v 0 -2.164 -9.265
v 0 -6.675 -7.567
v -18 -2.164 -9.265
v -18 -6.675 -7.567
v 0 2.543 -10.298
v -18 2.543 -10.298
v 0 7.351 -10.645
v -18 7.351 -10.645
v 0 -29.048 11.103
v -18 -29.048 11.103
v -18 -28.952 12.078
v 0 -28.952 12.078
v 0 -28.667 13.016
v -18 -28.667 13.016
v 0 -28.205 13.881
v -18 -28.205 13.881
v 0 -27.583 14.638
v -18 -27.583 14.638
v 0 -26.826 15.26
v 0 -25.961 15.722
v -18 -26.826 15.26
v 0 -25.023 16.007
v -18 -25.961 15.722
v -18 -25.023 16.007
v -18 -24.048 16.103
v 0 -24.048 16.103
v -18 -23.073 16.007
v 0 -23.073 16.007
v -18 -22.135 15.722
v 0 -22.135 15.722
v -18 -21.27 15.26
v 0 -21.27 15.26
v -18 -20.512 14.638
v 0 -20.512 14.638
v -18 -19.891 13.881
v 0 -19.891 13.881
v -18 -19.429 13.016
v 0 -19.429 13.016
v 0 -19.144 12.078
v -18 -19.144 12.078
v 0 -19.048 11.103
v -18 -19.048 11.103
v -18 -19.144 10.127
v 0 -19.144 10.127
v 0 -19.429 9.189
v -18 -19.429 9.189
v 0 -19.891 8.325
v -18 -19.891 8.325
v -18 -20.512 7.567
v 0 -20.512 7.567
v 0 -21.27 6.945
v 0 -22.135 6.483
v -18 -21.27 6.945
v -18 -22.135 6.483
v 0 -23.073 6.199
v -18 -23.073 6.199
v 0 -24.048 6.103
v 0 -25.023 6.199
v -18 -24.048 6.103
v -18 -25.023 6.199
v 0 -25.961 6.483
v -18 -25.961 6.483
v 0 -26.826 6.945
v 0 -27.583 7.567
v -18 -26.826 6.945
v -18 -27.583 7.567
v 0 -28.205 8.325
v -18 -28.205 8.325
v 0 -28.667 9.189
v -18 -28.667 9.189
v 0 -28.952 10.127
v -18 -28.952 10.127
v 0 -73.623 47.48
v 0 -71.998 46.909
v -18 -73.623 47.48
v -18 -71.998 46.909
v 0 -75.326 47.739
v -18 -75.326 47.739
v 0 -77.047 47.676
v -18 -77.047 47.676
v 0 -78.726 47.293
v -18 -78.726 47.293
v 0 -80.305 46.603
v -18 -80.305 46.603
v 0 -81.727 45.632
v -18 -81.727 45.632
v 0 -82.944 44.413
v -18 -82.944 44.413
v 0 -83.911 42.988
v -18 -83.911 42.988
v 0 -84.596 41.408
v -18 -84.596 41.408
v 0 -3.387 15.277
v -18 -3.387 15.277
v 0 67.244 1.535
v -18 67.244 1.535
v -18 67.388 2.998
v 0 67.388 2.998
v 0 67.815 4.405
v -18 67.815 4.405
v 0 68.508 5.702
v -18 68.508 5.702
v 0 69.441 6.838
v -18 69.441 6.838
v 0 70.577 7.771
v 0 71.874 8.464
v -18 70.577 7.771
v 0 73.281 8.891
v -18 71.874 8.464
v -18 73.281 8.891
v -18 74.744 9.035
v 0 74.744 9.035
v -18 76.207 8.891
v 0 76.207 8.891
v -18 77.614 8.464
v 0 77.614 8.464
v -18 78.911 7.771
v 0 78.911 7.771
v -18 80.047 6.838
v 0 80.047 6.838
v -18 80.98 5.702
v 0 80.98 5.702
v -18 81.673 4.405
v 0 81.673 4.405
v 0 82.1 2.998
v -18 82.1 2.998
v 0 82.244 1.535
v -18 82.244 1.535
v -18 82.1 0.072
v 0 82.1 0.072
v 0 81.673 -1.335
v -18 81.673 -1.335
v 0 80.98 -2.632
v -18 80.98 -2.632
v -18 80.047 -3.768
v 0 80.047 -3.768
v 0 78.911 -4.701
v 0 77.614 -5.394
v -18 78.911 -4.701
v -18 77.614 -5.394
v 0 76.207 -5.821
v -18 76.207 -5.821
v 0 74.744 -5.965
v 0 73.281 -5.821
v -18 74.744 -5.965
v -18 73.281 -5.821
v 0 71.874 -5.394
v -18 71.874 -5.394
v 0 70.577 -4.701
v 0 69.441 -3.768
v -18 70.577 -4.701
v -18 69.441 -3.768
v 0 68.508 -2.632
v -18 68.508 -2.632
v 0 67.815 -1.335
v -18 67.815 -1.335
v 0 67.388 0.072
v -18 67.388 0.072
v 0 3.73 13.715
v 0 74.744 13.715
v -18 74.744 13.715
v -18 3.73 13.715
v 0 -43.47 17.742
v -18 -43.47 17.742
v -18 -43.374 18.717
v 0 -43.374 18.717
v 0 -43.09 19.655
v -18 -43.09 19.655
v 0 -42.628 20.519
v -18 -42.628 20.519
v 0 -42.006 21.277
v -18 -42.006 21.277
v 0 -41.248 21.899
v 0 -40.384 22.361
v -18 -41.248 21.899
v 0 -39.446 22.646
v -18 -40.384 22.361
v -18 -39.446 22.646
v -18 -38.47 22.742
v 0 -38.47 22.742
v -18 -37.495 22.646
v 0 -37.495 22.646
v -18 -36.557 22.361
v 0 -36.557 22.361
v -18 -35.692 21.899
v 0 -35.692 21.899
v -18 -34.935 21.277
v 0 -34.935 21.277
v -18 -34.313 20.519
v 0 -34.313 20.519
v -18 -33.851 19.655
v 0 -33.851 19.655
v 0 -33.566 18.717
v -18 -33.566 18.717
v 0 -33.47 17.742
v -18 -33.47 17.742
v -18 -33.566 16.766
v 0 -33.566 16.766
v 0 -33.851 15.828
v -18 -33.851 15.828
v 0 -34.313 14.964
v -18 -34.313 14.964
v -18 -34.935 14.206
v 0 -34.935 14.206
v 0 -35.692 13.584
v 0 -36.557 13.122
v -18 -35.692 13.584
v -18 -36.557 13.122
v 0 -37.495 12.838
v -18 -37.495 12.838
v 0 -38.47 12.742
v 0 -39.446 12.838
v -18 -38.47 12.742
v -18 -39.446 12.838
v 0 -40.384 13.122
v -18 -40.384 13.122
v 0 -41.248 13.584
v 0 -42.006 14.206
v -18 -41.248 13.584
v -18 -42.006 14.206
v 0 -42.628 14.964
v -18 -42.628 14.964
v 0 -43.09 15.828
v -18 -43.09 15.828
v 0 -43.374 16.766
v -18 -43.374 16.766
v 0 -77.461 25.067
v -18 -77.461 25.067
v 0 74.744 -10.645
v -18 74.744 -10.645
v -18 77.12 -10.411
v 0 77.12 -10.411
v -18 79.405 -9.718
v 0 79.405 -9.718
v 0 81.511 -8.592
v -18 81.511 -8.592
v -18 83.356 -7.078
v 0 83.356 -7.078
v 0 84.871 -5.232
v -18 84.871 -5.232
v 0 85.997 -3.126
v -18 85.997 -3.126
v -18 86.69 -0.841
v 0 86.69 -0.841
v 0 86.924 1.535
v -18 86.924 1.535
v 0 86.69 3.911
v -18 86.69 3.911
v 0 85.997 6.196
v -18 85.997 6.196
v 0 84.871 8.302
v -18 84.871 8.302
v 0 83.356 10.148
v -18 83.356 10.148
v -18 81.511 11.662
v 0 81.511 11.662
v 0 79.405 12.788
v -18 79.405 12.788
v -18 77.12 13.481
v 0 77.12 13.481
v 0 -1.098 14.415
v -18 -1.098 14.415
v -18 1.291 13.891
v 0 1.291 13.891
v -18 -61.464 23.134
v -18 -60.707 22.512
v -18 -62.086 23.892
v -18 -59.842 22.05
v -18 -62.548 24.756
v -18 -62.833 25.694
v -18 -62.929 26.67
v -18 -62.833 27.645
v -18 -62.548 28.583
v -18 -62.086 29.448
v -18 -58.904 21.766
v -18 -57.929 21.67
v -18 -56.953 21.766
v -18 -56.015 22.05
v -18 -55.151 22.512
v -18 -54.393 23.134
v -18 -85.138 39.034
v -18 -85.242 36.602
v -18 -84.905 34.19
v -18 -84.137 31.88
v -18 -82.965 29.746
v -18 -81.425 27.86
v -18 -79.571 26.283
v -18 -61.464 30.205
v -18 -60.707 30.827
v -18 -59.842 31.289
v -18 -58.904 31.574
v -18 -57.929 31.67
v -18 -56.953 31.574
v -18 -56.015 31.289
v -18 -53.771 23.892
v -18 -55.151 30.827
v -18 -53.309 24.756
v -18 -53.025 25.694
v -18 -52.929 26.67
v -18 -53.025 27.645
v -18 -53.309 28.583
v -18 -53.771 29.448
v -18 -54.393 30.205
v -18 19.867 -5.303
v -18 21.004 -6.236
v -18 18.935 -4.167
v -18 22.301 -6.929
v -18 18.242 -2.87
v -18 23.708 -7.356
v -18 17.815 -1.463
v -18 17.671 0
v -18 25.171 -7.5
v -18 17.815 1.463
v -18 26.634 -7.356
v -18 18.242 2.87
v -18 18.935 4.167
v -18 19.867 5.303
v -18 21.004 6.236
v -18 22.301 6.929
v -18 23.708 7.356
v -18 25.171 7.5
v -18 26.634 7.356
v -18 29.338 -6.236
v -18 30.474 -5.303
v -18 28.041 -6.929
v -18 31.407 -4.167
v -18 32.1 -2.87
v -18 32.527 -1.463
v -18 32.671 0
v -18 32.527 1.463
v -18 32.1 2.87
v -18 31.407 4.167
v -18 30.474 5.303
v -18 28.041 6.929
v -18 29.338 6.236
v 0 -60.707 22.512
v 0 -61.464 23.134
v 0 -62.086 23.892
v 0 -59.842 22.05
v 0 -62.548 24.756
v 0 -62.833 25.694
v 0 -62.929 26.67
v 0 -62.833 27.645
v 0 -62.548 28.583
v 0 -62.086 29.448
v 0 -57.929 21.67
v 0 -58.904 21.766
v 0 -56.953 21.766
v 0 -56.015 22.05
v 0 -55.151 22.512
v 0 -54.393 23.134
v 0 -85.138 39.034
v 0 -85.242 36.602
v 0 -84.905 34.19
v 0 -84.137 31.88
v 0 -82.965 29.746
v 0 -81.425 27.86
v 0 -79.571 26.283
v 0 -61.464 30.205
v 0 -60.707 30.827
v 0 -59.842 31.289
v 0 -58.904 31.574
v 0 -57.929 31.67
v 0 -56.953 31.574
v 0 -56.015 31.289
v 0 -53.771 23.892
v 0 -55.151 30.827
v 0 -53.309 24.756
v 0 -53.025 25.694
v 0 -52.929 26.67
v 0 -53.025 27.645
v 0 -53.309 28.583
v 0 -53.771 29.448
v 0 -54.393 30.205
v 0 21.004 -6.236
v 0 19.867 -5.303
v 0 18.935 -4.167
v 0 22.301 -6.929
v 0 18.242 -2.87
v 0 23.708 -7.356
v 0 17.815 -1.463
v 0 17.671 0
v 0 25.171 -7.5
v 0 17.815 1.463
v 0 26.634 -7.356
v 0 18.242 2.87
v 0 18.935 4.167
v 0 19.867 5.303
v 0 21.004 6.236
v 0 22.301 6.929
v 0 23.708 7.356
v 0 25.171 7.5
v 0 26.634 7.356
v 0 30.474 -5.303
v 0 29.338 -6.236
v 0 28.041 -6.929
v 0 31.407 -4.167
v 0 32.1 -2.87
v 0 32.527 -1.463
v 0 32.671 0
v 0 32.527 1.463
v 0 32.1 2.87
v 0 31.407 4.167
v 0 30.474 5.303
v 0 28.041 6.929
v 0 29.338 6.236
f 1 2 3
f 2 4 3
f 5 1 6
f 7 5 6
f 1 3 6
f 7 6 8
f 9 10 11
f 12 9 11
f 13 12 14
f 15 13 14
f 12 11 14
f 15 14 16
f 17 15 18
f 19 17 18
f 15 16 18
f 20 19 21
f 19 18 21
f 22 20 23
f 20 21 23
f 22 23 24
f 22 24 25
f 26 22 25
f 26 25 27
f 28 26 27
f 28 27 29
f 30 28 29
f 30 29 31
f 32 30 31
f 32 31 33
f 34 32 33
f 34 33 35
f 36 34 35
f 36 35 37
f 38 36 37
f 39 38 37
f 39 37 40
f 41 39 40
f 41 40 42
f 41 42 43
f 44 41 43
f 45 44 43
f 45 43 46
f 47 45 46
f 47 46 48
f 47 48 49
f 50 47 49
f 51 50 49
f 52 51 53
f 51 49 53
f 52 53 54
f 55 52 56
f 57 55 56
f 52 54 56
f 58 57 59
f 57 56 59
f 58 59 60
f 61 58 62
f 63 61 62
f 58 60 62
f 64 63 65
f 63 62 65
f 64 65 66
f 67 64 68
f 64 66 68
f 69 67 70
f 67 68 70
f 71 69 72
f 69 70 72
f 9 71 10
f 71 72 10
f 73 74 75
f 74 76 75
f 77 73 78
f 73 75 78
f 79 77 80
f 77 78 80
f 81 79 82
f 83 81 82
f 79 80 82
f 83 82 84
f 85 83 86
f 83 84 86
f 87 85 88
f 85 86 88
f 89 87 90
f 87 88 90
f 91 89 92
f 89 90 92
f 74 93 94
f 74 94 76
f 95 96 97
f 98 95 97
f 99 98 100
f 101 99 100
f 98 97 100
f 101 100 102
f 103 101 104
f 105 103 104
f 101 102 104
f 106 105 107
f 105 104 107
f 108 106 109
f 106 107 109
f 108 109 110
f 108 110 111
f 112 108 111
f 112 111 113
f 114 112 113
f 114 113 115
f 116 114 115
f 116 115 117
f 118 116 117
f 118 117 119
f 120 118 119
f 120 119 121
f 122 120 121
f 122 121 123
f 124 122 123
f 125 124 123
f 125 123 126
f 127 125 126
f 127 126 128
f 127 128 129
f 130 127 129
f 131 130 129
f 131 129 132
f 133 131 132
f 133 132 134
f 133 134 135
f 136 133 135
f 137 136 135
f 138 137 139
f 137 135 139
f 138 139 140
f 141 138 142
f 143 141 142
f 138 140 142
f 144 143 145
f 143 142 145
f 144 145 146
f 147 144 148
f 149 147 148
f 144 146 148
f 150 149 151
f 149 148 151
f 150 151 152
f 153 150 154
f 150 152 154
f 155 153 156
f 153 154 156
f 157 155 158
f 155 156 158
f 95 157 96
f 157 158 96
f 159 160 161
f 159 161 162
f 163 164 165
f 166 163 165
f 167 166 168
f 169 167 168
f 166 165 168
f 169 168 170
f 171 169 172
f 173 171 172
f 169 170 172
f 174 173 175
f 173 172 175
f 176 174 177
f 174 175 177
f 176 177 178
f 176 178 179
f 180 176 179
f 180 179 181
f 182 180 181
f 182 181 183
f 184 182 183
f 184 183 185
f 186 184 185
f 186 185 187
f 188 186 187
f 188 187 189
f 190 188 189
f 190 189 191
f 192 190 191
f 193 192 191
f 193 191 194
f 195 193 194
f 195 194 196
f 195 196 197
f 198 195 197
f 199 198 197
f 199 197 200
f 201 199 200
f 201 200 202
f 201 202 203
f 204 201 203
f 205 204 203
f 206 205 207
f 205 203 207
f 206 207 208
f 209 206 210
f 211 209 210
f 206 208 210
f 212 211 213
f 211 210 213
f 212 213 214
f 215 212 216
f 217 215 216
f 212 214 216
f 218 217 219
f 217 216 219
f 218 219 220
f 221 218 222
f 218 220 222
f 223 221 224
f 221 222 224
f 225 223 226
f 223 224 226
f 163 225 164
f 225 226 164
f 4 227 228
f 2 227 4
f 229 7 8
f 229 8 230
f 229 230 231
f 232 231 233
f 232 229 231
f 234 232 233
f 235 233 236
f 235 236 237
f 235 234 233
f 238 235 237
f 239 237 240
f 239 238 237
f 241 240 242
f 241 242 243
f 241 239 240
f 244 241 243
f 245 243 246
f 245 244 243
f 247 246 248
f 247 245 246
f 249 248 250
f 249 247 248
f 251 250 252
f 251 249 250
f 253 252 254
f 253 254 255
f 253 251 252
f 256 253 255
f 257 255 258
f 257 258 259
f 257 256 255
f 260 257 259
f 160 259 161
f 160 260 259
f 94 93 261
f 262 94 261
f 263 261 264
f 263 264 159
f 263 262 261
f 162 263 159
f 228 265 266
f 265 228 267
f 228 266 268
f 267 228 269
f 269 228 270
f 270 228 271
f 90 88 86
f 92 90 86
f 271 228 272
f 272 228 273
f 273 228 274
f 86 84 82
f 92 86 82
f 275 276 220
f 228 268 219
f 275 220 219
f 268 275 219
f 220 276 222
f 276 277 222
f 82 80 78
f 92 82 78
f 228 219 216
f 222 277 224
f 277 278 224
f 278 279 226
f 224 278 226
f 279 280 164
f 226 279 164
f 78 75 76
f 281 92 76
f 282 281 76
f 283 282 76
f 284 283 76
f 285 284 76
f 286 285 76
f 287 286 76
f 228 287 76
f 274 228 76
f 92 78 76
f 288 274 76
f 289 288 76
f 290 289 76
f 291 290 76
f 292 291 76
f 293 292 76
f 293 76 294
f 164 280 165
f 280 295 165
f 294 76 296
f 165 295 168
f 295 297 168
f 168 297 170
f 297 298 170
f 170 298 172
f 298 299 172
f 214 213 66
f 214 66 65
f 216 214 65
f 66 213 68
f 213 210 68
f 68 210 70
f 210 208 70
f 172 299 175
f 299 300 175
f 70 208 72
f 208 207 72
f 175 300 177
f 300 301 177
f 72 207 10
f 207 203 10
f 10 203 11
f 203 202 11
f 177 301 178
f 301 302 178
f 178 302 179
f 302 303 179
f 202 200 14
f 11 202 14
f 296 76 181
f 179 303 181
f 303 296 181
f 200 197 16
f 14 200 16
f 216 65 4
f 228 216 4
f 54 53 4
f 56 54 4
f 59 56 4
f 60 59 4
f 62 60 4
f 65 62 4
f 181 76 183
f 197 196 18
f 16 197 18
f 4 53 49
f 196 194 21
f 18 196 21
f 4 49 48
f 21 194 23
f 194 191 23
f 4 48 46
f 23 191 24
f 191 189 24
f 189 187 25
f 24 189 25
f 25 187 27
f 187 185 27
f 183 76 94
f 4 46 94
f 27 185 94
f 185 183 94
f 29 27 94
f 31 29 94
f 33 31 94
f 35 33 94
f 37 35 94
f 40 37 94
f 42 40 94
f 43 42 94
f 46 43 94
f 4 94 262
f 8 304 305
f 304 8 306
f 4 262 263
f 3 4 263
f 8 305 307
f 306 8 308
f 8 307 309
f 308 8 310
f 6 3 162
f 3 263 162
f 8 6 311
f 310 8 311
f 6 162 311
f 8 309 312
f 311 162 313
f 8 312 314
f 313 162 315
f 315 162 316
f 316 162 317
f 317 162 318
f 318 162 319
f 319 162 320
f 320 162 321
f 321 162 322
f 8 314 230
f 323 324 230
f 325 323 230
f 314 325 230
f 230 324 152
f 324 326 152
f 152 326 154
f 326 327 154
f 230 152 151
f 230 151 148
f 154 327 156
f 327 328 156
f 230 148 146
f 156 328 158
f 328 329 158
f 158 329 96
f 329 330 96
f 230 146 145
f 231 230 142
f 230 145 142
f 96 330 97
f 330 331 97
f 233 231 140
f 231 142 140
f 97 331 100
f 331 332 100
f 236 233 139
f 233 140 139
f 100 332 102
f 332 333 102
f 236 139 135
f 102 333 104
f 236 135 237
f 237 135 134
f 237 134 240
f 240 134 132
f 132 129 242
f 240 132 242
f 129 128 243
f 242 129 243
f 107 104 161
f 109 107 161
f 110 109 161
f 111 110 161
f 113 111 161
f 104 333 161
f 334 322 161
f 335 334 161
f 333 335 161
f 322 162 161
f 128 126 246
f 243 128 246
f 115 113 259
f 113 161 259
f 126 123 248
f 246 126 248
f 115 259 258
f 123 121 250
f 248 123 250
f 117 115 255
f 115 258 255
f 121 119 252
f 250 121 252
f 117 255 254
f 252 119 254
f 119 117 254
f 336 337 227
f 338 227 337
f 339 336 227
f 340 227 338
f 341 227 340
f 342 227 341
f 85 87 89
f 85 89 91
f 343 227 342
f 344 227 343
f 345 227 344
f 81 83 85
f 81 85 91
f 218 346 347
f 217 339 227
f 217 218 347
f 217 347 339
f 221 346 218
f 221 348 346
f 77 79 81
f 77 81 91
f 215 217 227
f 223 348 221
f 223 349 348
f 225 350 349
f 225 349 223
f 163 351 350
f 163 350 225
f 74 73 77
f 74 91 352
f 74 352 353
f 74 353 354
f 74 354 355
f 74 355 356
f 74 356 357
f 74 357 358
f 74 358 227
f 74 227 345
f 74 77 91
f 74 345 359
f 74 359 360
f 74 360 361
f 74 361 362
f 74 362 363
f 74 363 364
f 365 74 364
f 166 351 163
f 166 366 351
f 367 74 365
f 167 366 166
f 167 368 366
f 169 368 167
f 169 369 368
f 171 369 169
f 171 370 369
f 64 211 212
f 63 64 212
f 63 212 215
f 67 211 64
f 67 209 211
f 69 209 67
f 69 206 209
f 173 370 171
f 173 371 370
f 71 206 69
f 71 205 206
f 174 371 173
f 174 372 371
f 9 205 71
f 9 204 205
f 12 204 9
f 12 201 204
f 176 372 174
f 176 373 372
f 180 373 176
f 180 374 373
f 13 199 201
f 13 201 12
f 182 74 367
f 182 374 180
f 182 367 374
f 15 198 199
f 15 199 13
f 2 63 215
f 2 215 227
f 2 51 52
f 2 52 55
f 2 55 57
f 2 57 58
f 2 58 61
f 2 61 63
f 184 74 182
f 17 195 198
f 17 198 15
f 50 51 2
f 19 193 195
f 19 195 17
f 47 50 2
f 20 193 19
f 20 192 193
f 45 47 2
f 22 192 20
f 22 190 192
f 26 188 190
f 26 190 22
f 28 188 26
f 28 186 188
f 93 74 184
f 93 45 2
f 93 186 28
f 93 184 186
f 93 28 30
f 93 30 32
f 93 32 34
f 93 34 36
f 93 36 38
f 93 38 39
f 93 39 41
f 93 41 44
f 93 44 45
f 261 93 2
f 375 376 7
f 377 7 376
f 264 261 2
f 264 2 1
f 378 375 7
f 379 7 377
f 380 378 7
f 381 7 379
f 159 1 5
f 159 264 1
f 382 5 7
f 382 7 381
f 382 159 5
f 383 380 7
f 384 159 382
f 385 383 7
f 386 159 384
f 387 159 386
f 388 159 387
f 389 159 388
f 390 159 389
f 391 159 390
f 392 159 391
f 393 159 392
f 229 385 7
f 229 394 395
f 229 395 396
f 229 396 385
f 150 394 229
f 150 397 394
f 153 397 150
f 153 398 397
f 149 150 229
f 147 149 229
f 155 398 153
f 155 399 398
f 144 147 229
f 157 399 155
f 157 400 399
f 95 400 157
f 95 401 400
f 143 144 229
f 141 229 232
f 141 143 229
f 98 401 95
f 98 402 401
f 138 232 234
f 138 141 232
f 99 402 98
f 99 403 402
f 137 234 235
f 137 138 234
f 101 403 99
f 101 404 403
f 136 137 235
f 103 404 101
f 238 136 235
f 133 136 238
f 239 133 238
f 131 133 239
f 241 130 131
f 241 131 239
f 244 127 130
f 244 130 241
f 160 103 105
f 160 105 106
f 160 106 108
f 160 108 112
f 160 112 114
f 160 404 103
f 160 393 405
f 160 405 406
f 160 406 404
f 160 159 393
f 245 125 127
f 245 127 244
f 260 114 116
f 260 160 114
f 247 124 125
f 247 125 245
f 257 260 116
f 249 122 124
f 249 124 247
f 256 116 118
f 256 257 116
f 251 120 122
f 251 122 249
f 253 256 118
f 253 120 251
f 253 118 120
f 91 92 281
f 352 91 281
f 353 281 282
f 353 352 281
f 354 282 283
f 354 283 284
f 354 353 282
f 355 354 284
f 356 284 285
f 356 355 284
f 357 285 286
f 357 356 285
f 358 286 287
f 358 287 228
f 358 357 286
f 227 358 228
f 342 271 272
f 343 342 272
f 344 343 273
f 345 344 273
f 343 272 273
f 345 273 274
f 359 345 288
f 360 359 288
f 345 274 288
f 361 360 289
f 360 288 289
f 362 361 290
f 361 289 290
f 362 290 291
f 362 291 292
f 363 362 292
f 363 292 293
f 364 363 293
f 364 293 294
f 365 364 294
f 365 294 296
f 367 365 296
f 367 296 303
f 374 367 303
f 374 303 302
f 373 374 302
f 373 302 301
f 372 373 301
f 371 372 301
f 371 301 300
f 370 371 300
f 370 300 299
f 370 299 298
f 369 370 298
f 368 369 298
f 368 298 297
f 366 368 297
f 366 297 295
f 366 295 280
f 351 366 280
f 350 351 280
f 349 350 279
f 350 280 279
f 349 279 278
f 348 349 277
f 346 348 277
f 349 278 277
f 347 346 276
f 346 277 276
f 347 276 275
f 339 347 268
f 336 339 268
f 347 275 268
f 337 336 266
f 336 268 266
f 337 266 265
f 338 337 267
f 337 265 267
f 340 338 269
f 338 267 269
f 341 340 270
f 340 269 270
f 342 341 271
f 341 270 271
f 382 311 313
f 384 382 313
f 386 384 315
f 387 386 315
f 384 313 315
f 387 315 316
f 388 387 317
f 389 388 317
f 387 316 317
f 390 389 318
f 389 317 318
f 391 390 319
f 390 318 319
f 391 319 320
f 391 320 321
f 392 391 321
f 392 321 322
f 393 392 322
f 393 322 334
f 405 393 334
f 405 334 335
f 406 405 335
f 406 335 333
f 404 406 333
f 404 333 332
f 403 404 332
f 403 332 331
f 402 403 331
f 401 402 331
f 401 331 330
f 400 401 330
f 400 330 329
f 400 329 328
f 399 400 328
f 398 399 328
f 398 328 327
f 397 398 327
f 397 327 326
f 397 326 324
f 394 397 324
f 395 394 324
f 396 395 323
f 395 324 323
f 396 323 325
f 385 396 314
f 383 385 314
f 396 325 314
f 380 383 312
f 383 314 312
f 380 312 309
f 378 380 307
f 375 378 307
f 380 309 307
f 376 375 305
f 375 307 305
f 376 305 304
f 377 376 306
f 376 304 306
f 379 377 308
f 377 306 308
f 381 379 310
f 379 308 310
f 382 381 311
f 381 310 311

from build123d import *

# Parameters (mm, degrees)
F1_DEPTH = 18
F2_R     = 9.2
F4_D     = 10
F5_R     = 33.5
F6_R     = 17
F7_D     = 15


with BuildPart() as f1:
    # F0 (on Right) → F1 (new body)
    with BuildSketch(Plane.YZ):
        with BuildLine():
            Line((74.743822, 13.714945), (0, 13.714945))
            Line((0, 13.714945), (-77.461272, 49.427156))
            ThreePointArc((-77.461272, 49.427156), (-85.257986, 37.247191), (-77.461272, 25.067225))
            Line((-77.461272, 25.067225), (0, -10.644986))
            Line((0, -10.644986), (74.743822, -10.644986))
            ThreePointArc((74.743822, -10.644986), (86.923788, 1.534979), (74.743822, 13.714945))
        make_face()
    extrude(amount=-F1_DEPTH)

    # F2
    f2_edges = [f1.edges().sort_by_distance(p)[0] for p in [
        (-9, -77.461272, 49.427156),
    ]]
    fillet(f2_edges, radius=F2_R)

    # F4 (through all)
    with Locations(Plane.YZ):
        with Locations((-57.928775, 26.669696), (-38.470201, 17.741643), (-24.047961, 11.102834)):
            Hole(F4_D / 2)

    # F5
    f5_edges = [f1.edges().sort_by_distance(p)[0] for p in [
        (-9, 0, -10.644986),
    ]]
    fillet(f5_edges, radius=F5_R)

    # F6
    f6_edges = [f1.edges().sort_by_distance(p)[0] for p in [
        (-9, 0, 13.714945),
    ]]
    fillet(f6_edges, radius=F6_R)

    # F7 (through all)
    with Locations(Plane.YZ):
        with Locations((25.170794, 0), (74.743822, 1.534979)):
            Hole(F7_D / 2)


solid = f1.part
